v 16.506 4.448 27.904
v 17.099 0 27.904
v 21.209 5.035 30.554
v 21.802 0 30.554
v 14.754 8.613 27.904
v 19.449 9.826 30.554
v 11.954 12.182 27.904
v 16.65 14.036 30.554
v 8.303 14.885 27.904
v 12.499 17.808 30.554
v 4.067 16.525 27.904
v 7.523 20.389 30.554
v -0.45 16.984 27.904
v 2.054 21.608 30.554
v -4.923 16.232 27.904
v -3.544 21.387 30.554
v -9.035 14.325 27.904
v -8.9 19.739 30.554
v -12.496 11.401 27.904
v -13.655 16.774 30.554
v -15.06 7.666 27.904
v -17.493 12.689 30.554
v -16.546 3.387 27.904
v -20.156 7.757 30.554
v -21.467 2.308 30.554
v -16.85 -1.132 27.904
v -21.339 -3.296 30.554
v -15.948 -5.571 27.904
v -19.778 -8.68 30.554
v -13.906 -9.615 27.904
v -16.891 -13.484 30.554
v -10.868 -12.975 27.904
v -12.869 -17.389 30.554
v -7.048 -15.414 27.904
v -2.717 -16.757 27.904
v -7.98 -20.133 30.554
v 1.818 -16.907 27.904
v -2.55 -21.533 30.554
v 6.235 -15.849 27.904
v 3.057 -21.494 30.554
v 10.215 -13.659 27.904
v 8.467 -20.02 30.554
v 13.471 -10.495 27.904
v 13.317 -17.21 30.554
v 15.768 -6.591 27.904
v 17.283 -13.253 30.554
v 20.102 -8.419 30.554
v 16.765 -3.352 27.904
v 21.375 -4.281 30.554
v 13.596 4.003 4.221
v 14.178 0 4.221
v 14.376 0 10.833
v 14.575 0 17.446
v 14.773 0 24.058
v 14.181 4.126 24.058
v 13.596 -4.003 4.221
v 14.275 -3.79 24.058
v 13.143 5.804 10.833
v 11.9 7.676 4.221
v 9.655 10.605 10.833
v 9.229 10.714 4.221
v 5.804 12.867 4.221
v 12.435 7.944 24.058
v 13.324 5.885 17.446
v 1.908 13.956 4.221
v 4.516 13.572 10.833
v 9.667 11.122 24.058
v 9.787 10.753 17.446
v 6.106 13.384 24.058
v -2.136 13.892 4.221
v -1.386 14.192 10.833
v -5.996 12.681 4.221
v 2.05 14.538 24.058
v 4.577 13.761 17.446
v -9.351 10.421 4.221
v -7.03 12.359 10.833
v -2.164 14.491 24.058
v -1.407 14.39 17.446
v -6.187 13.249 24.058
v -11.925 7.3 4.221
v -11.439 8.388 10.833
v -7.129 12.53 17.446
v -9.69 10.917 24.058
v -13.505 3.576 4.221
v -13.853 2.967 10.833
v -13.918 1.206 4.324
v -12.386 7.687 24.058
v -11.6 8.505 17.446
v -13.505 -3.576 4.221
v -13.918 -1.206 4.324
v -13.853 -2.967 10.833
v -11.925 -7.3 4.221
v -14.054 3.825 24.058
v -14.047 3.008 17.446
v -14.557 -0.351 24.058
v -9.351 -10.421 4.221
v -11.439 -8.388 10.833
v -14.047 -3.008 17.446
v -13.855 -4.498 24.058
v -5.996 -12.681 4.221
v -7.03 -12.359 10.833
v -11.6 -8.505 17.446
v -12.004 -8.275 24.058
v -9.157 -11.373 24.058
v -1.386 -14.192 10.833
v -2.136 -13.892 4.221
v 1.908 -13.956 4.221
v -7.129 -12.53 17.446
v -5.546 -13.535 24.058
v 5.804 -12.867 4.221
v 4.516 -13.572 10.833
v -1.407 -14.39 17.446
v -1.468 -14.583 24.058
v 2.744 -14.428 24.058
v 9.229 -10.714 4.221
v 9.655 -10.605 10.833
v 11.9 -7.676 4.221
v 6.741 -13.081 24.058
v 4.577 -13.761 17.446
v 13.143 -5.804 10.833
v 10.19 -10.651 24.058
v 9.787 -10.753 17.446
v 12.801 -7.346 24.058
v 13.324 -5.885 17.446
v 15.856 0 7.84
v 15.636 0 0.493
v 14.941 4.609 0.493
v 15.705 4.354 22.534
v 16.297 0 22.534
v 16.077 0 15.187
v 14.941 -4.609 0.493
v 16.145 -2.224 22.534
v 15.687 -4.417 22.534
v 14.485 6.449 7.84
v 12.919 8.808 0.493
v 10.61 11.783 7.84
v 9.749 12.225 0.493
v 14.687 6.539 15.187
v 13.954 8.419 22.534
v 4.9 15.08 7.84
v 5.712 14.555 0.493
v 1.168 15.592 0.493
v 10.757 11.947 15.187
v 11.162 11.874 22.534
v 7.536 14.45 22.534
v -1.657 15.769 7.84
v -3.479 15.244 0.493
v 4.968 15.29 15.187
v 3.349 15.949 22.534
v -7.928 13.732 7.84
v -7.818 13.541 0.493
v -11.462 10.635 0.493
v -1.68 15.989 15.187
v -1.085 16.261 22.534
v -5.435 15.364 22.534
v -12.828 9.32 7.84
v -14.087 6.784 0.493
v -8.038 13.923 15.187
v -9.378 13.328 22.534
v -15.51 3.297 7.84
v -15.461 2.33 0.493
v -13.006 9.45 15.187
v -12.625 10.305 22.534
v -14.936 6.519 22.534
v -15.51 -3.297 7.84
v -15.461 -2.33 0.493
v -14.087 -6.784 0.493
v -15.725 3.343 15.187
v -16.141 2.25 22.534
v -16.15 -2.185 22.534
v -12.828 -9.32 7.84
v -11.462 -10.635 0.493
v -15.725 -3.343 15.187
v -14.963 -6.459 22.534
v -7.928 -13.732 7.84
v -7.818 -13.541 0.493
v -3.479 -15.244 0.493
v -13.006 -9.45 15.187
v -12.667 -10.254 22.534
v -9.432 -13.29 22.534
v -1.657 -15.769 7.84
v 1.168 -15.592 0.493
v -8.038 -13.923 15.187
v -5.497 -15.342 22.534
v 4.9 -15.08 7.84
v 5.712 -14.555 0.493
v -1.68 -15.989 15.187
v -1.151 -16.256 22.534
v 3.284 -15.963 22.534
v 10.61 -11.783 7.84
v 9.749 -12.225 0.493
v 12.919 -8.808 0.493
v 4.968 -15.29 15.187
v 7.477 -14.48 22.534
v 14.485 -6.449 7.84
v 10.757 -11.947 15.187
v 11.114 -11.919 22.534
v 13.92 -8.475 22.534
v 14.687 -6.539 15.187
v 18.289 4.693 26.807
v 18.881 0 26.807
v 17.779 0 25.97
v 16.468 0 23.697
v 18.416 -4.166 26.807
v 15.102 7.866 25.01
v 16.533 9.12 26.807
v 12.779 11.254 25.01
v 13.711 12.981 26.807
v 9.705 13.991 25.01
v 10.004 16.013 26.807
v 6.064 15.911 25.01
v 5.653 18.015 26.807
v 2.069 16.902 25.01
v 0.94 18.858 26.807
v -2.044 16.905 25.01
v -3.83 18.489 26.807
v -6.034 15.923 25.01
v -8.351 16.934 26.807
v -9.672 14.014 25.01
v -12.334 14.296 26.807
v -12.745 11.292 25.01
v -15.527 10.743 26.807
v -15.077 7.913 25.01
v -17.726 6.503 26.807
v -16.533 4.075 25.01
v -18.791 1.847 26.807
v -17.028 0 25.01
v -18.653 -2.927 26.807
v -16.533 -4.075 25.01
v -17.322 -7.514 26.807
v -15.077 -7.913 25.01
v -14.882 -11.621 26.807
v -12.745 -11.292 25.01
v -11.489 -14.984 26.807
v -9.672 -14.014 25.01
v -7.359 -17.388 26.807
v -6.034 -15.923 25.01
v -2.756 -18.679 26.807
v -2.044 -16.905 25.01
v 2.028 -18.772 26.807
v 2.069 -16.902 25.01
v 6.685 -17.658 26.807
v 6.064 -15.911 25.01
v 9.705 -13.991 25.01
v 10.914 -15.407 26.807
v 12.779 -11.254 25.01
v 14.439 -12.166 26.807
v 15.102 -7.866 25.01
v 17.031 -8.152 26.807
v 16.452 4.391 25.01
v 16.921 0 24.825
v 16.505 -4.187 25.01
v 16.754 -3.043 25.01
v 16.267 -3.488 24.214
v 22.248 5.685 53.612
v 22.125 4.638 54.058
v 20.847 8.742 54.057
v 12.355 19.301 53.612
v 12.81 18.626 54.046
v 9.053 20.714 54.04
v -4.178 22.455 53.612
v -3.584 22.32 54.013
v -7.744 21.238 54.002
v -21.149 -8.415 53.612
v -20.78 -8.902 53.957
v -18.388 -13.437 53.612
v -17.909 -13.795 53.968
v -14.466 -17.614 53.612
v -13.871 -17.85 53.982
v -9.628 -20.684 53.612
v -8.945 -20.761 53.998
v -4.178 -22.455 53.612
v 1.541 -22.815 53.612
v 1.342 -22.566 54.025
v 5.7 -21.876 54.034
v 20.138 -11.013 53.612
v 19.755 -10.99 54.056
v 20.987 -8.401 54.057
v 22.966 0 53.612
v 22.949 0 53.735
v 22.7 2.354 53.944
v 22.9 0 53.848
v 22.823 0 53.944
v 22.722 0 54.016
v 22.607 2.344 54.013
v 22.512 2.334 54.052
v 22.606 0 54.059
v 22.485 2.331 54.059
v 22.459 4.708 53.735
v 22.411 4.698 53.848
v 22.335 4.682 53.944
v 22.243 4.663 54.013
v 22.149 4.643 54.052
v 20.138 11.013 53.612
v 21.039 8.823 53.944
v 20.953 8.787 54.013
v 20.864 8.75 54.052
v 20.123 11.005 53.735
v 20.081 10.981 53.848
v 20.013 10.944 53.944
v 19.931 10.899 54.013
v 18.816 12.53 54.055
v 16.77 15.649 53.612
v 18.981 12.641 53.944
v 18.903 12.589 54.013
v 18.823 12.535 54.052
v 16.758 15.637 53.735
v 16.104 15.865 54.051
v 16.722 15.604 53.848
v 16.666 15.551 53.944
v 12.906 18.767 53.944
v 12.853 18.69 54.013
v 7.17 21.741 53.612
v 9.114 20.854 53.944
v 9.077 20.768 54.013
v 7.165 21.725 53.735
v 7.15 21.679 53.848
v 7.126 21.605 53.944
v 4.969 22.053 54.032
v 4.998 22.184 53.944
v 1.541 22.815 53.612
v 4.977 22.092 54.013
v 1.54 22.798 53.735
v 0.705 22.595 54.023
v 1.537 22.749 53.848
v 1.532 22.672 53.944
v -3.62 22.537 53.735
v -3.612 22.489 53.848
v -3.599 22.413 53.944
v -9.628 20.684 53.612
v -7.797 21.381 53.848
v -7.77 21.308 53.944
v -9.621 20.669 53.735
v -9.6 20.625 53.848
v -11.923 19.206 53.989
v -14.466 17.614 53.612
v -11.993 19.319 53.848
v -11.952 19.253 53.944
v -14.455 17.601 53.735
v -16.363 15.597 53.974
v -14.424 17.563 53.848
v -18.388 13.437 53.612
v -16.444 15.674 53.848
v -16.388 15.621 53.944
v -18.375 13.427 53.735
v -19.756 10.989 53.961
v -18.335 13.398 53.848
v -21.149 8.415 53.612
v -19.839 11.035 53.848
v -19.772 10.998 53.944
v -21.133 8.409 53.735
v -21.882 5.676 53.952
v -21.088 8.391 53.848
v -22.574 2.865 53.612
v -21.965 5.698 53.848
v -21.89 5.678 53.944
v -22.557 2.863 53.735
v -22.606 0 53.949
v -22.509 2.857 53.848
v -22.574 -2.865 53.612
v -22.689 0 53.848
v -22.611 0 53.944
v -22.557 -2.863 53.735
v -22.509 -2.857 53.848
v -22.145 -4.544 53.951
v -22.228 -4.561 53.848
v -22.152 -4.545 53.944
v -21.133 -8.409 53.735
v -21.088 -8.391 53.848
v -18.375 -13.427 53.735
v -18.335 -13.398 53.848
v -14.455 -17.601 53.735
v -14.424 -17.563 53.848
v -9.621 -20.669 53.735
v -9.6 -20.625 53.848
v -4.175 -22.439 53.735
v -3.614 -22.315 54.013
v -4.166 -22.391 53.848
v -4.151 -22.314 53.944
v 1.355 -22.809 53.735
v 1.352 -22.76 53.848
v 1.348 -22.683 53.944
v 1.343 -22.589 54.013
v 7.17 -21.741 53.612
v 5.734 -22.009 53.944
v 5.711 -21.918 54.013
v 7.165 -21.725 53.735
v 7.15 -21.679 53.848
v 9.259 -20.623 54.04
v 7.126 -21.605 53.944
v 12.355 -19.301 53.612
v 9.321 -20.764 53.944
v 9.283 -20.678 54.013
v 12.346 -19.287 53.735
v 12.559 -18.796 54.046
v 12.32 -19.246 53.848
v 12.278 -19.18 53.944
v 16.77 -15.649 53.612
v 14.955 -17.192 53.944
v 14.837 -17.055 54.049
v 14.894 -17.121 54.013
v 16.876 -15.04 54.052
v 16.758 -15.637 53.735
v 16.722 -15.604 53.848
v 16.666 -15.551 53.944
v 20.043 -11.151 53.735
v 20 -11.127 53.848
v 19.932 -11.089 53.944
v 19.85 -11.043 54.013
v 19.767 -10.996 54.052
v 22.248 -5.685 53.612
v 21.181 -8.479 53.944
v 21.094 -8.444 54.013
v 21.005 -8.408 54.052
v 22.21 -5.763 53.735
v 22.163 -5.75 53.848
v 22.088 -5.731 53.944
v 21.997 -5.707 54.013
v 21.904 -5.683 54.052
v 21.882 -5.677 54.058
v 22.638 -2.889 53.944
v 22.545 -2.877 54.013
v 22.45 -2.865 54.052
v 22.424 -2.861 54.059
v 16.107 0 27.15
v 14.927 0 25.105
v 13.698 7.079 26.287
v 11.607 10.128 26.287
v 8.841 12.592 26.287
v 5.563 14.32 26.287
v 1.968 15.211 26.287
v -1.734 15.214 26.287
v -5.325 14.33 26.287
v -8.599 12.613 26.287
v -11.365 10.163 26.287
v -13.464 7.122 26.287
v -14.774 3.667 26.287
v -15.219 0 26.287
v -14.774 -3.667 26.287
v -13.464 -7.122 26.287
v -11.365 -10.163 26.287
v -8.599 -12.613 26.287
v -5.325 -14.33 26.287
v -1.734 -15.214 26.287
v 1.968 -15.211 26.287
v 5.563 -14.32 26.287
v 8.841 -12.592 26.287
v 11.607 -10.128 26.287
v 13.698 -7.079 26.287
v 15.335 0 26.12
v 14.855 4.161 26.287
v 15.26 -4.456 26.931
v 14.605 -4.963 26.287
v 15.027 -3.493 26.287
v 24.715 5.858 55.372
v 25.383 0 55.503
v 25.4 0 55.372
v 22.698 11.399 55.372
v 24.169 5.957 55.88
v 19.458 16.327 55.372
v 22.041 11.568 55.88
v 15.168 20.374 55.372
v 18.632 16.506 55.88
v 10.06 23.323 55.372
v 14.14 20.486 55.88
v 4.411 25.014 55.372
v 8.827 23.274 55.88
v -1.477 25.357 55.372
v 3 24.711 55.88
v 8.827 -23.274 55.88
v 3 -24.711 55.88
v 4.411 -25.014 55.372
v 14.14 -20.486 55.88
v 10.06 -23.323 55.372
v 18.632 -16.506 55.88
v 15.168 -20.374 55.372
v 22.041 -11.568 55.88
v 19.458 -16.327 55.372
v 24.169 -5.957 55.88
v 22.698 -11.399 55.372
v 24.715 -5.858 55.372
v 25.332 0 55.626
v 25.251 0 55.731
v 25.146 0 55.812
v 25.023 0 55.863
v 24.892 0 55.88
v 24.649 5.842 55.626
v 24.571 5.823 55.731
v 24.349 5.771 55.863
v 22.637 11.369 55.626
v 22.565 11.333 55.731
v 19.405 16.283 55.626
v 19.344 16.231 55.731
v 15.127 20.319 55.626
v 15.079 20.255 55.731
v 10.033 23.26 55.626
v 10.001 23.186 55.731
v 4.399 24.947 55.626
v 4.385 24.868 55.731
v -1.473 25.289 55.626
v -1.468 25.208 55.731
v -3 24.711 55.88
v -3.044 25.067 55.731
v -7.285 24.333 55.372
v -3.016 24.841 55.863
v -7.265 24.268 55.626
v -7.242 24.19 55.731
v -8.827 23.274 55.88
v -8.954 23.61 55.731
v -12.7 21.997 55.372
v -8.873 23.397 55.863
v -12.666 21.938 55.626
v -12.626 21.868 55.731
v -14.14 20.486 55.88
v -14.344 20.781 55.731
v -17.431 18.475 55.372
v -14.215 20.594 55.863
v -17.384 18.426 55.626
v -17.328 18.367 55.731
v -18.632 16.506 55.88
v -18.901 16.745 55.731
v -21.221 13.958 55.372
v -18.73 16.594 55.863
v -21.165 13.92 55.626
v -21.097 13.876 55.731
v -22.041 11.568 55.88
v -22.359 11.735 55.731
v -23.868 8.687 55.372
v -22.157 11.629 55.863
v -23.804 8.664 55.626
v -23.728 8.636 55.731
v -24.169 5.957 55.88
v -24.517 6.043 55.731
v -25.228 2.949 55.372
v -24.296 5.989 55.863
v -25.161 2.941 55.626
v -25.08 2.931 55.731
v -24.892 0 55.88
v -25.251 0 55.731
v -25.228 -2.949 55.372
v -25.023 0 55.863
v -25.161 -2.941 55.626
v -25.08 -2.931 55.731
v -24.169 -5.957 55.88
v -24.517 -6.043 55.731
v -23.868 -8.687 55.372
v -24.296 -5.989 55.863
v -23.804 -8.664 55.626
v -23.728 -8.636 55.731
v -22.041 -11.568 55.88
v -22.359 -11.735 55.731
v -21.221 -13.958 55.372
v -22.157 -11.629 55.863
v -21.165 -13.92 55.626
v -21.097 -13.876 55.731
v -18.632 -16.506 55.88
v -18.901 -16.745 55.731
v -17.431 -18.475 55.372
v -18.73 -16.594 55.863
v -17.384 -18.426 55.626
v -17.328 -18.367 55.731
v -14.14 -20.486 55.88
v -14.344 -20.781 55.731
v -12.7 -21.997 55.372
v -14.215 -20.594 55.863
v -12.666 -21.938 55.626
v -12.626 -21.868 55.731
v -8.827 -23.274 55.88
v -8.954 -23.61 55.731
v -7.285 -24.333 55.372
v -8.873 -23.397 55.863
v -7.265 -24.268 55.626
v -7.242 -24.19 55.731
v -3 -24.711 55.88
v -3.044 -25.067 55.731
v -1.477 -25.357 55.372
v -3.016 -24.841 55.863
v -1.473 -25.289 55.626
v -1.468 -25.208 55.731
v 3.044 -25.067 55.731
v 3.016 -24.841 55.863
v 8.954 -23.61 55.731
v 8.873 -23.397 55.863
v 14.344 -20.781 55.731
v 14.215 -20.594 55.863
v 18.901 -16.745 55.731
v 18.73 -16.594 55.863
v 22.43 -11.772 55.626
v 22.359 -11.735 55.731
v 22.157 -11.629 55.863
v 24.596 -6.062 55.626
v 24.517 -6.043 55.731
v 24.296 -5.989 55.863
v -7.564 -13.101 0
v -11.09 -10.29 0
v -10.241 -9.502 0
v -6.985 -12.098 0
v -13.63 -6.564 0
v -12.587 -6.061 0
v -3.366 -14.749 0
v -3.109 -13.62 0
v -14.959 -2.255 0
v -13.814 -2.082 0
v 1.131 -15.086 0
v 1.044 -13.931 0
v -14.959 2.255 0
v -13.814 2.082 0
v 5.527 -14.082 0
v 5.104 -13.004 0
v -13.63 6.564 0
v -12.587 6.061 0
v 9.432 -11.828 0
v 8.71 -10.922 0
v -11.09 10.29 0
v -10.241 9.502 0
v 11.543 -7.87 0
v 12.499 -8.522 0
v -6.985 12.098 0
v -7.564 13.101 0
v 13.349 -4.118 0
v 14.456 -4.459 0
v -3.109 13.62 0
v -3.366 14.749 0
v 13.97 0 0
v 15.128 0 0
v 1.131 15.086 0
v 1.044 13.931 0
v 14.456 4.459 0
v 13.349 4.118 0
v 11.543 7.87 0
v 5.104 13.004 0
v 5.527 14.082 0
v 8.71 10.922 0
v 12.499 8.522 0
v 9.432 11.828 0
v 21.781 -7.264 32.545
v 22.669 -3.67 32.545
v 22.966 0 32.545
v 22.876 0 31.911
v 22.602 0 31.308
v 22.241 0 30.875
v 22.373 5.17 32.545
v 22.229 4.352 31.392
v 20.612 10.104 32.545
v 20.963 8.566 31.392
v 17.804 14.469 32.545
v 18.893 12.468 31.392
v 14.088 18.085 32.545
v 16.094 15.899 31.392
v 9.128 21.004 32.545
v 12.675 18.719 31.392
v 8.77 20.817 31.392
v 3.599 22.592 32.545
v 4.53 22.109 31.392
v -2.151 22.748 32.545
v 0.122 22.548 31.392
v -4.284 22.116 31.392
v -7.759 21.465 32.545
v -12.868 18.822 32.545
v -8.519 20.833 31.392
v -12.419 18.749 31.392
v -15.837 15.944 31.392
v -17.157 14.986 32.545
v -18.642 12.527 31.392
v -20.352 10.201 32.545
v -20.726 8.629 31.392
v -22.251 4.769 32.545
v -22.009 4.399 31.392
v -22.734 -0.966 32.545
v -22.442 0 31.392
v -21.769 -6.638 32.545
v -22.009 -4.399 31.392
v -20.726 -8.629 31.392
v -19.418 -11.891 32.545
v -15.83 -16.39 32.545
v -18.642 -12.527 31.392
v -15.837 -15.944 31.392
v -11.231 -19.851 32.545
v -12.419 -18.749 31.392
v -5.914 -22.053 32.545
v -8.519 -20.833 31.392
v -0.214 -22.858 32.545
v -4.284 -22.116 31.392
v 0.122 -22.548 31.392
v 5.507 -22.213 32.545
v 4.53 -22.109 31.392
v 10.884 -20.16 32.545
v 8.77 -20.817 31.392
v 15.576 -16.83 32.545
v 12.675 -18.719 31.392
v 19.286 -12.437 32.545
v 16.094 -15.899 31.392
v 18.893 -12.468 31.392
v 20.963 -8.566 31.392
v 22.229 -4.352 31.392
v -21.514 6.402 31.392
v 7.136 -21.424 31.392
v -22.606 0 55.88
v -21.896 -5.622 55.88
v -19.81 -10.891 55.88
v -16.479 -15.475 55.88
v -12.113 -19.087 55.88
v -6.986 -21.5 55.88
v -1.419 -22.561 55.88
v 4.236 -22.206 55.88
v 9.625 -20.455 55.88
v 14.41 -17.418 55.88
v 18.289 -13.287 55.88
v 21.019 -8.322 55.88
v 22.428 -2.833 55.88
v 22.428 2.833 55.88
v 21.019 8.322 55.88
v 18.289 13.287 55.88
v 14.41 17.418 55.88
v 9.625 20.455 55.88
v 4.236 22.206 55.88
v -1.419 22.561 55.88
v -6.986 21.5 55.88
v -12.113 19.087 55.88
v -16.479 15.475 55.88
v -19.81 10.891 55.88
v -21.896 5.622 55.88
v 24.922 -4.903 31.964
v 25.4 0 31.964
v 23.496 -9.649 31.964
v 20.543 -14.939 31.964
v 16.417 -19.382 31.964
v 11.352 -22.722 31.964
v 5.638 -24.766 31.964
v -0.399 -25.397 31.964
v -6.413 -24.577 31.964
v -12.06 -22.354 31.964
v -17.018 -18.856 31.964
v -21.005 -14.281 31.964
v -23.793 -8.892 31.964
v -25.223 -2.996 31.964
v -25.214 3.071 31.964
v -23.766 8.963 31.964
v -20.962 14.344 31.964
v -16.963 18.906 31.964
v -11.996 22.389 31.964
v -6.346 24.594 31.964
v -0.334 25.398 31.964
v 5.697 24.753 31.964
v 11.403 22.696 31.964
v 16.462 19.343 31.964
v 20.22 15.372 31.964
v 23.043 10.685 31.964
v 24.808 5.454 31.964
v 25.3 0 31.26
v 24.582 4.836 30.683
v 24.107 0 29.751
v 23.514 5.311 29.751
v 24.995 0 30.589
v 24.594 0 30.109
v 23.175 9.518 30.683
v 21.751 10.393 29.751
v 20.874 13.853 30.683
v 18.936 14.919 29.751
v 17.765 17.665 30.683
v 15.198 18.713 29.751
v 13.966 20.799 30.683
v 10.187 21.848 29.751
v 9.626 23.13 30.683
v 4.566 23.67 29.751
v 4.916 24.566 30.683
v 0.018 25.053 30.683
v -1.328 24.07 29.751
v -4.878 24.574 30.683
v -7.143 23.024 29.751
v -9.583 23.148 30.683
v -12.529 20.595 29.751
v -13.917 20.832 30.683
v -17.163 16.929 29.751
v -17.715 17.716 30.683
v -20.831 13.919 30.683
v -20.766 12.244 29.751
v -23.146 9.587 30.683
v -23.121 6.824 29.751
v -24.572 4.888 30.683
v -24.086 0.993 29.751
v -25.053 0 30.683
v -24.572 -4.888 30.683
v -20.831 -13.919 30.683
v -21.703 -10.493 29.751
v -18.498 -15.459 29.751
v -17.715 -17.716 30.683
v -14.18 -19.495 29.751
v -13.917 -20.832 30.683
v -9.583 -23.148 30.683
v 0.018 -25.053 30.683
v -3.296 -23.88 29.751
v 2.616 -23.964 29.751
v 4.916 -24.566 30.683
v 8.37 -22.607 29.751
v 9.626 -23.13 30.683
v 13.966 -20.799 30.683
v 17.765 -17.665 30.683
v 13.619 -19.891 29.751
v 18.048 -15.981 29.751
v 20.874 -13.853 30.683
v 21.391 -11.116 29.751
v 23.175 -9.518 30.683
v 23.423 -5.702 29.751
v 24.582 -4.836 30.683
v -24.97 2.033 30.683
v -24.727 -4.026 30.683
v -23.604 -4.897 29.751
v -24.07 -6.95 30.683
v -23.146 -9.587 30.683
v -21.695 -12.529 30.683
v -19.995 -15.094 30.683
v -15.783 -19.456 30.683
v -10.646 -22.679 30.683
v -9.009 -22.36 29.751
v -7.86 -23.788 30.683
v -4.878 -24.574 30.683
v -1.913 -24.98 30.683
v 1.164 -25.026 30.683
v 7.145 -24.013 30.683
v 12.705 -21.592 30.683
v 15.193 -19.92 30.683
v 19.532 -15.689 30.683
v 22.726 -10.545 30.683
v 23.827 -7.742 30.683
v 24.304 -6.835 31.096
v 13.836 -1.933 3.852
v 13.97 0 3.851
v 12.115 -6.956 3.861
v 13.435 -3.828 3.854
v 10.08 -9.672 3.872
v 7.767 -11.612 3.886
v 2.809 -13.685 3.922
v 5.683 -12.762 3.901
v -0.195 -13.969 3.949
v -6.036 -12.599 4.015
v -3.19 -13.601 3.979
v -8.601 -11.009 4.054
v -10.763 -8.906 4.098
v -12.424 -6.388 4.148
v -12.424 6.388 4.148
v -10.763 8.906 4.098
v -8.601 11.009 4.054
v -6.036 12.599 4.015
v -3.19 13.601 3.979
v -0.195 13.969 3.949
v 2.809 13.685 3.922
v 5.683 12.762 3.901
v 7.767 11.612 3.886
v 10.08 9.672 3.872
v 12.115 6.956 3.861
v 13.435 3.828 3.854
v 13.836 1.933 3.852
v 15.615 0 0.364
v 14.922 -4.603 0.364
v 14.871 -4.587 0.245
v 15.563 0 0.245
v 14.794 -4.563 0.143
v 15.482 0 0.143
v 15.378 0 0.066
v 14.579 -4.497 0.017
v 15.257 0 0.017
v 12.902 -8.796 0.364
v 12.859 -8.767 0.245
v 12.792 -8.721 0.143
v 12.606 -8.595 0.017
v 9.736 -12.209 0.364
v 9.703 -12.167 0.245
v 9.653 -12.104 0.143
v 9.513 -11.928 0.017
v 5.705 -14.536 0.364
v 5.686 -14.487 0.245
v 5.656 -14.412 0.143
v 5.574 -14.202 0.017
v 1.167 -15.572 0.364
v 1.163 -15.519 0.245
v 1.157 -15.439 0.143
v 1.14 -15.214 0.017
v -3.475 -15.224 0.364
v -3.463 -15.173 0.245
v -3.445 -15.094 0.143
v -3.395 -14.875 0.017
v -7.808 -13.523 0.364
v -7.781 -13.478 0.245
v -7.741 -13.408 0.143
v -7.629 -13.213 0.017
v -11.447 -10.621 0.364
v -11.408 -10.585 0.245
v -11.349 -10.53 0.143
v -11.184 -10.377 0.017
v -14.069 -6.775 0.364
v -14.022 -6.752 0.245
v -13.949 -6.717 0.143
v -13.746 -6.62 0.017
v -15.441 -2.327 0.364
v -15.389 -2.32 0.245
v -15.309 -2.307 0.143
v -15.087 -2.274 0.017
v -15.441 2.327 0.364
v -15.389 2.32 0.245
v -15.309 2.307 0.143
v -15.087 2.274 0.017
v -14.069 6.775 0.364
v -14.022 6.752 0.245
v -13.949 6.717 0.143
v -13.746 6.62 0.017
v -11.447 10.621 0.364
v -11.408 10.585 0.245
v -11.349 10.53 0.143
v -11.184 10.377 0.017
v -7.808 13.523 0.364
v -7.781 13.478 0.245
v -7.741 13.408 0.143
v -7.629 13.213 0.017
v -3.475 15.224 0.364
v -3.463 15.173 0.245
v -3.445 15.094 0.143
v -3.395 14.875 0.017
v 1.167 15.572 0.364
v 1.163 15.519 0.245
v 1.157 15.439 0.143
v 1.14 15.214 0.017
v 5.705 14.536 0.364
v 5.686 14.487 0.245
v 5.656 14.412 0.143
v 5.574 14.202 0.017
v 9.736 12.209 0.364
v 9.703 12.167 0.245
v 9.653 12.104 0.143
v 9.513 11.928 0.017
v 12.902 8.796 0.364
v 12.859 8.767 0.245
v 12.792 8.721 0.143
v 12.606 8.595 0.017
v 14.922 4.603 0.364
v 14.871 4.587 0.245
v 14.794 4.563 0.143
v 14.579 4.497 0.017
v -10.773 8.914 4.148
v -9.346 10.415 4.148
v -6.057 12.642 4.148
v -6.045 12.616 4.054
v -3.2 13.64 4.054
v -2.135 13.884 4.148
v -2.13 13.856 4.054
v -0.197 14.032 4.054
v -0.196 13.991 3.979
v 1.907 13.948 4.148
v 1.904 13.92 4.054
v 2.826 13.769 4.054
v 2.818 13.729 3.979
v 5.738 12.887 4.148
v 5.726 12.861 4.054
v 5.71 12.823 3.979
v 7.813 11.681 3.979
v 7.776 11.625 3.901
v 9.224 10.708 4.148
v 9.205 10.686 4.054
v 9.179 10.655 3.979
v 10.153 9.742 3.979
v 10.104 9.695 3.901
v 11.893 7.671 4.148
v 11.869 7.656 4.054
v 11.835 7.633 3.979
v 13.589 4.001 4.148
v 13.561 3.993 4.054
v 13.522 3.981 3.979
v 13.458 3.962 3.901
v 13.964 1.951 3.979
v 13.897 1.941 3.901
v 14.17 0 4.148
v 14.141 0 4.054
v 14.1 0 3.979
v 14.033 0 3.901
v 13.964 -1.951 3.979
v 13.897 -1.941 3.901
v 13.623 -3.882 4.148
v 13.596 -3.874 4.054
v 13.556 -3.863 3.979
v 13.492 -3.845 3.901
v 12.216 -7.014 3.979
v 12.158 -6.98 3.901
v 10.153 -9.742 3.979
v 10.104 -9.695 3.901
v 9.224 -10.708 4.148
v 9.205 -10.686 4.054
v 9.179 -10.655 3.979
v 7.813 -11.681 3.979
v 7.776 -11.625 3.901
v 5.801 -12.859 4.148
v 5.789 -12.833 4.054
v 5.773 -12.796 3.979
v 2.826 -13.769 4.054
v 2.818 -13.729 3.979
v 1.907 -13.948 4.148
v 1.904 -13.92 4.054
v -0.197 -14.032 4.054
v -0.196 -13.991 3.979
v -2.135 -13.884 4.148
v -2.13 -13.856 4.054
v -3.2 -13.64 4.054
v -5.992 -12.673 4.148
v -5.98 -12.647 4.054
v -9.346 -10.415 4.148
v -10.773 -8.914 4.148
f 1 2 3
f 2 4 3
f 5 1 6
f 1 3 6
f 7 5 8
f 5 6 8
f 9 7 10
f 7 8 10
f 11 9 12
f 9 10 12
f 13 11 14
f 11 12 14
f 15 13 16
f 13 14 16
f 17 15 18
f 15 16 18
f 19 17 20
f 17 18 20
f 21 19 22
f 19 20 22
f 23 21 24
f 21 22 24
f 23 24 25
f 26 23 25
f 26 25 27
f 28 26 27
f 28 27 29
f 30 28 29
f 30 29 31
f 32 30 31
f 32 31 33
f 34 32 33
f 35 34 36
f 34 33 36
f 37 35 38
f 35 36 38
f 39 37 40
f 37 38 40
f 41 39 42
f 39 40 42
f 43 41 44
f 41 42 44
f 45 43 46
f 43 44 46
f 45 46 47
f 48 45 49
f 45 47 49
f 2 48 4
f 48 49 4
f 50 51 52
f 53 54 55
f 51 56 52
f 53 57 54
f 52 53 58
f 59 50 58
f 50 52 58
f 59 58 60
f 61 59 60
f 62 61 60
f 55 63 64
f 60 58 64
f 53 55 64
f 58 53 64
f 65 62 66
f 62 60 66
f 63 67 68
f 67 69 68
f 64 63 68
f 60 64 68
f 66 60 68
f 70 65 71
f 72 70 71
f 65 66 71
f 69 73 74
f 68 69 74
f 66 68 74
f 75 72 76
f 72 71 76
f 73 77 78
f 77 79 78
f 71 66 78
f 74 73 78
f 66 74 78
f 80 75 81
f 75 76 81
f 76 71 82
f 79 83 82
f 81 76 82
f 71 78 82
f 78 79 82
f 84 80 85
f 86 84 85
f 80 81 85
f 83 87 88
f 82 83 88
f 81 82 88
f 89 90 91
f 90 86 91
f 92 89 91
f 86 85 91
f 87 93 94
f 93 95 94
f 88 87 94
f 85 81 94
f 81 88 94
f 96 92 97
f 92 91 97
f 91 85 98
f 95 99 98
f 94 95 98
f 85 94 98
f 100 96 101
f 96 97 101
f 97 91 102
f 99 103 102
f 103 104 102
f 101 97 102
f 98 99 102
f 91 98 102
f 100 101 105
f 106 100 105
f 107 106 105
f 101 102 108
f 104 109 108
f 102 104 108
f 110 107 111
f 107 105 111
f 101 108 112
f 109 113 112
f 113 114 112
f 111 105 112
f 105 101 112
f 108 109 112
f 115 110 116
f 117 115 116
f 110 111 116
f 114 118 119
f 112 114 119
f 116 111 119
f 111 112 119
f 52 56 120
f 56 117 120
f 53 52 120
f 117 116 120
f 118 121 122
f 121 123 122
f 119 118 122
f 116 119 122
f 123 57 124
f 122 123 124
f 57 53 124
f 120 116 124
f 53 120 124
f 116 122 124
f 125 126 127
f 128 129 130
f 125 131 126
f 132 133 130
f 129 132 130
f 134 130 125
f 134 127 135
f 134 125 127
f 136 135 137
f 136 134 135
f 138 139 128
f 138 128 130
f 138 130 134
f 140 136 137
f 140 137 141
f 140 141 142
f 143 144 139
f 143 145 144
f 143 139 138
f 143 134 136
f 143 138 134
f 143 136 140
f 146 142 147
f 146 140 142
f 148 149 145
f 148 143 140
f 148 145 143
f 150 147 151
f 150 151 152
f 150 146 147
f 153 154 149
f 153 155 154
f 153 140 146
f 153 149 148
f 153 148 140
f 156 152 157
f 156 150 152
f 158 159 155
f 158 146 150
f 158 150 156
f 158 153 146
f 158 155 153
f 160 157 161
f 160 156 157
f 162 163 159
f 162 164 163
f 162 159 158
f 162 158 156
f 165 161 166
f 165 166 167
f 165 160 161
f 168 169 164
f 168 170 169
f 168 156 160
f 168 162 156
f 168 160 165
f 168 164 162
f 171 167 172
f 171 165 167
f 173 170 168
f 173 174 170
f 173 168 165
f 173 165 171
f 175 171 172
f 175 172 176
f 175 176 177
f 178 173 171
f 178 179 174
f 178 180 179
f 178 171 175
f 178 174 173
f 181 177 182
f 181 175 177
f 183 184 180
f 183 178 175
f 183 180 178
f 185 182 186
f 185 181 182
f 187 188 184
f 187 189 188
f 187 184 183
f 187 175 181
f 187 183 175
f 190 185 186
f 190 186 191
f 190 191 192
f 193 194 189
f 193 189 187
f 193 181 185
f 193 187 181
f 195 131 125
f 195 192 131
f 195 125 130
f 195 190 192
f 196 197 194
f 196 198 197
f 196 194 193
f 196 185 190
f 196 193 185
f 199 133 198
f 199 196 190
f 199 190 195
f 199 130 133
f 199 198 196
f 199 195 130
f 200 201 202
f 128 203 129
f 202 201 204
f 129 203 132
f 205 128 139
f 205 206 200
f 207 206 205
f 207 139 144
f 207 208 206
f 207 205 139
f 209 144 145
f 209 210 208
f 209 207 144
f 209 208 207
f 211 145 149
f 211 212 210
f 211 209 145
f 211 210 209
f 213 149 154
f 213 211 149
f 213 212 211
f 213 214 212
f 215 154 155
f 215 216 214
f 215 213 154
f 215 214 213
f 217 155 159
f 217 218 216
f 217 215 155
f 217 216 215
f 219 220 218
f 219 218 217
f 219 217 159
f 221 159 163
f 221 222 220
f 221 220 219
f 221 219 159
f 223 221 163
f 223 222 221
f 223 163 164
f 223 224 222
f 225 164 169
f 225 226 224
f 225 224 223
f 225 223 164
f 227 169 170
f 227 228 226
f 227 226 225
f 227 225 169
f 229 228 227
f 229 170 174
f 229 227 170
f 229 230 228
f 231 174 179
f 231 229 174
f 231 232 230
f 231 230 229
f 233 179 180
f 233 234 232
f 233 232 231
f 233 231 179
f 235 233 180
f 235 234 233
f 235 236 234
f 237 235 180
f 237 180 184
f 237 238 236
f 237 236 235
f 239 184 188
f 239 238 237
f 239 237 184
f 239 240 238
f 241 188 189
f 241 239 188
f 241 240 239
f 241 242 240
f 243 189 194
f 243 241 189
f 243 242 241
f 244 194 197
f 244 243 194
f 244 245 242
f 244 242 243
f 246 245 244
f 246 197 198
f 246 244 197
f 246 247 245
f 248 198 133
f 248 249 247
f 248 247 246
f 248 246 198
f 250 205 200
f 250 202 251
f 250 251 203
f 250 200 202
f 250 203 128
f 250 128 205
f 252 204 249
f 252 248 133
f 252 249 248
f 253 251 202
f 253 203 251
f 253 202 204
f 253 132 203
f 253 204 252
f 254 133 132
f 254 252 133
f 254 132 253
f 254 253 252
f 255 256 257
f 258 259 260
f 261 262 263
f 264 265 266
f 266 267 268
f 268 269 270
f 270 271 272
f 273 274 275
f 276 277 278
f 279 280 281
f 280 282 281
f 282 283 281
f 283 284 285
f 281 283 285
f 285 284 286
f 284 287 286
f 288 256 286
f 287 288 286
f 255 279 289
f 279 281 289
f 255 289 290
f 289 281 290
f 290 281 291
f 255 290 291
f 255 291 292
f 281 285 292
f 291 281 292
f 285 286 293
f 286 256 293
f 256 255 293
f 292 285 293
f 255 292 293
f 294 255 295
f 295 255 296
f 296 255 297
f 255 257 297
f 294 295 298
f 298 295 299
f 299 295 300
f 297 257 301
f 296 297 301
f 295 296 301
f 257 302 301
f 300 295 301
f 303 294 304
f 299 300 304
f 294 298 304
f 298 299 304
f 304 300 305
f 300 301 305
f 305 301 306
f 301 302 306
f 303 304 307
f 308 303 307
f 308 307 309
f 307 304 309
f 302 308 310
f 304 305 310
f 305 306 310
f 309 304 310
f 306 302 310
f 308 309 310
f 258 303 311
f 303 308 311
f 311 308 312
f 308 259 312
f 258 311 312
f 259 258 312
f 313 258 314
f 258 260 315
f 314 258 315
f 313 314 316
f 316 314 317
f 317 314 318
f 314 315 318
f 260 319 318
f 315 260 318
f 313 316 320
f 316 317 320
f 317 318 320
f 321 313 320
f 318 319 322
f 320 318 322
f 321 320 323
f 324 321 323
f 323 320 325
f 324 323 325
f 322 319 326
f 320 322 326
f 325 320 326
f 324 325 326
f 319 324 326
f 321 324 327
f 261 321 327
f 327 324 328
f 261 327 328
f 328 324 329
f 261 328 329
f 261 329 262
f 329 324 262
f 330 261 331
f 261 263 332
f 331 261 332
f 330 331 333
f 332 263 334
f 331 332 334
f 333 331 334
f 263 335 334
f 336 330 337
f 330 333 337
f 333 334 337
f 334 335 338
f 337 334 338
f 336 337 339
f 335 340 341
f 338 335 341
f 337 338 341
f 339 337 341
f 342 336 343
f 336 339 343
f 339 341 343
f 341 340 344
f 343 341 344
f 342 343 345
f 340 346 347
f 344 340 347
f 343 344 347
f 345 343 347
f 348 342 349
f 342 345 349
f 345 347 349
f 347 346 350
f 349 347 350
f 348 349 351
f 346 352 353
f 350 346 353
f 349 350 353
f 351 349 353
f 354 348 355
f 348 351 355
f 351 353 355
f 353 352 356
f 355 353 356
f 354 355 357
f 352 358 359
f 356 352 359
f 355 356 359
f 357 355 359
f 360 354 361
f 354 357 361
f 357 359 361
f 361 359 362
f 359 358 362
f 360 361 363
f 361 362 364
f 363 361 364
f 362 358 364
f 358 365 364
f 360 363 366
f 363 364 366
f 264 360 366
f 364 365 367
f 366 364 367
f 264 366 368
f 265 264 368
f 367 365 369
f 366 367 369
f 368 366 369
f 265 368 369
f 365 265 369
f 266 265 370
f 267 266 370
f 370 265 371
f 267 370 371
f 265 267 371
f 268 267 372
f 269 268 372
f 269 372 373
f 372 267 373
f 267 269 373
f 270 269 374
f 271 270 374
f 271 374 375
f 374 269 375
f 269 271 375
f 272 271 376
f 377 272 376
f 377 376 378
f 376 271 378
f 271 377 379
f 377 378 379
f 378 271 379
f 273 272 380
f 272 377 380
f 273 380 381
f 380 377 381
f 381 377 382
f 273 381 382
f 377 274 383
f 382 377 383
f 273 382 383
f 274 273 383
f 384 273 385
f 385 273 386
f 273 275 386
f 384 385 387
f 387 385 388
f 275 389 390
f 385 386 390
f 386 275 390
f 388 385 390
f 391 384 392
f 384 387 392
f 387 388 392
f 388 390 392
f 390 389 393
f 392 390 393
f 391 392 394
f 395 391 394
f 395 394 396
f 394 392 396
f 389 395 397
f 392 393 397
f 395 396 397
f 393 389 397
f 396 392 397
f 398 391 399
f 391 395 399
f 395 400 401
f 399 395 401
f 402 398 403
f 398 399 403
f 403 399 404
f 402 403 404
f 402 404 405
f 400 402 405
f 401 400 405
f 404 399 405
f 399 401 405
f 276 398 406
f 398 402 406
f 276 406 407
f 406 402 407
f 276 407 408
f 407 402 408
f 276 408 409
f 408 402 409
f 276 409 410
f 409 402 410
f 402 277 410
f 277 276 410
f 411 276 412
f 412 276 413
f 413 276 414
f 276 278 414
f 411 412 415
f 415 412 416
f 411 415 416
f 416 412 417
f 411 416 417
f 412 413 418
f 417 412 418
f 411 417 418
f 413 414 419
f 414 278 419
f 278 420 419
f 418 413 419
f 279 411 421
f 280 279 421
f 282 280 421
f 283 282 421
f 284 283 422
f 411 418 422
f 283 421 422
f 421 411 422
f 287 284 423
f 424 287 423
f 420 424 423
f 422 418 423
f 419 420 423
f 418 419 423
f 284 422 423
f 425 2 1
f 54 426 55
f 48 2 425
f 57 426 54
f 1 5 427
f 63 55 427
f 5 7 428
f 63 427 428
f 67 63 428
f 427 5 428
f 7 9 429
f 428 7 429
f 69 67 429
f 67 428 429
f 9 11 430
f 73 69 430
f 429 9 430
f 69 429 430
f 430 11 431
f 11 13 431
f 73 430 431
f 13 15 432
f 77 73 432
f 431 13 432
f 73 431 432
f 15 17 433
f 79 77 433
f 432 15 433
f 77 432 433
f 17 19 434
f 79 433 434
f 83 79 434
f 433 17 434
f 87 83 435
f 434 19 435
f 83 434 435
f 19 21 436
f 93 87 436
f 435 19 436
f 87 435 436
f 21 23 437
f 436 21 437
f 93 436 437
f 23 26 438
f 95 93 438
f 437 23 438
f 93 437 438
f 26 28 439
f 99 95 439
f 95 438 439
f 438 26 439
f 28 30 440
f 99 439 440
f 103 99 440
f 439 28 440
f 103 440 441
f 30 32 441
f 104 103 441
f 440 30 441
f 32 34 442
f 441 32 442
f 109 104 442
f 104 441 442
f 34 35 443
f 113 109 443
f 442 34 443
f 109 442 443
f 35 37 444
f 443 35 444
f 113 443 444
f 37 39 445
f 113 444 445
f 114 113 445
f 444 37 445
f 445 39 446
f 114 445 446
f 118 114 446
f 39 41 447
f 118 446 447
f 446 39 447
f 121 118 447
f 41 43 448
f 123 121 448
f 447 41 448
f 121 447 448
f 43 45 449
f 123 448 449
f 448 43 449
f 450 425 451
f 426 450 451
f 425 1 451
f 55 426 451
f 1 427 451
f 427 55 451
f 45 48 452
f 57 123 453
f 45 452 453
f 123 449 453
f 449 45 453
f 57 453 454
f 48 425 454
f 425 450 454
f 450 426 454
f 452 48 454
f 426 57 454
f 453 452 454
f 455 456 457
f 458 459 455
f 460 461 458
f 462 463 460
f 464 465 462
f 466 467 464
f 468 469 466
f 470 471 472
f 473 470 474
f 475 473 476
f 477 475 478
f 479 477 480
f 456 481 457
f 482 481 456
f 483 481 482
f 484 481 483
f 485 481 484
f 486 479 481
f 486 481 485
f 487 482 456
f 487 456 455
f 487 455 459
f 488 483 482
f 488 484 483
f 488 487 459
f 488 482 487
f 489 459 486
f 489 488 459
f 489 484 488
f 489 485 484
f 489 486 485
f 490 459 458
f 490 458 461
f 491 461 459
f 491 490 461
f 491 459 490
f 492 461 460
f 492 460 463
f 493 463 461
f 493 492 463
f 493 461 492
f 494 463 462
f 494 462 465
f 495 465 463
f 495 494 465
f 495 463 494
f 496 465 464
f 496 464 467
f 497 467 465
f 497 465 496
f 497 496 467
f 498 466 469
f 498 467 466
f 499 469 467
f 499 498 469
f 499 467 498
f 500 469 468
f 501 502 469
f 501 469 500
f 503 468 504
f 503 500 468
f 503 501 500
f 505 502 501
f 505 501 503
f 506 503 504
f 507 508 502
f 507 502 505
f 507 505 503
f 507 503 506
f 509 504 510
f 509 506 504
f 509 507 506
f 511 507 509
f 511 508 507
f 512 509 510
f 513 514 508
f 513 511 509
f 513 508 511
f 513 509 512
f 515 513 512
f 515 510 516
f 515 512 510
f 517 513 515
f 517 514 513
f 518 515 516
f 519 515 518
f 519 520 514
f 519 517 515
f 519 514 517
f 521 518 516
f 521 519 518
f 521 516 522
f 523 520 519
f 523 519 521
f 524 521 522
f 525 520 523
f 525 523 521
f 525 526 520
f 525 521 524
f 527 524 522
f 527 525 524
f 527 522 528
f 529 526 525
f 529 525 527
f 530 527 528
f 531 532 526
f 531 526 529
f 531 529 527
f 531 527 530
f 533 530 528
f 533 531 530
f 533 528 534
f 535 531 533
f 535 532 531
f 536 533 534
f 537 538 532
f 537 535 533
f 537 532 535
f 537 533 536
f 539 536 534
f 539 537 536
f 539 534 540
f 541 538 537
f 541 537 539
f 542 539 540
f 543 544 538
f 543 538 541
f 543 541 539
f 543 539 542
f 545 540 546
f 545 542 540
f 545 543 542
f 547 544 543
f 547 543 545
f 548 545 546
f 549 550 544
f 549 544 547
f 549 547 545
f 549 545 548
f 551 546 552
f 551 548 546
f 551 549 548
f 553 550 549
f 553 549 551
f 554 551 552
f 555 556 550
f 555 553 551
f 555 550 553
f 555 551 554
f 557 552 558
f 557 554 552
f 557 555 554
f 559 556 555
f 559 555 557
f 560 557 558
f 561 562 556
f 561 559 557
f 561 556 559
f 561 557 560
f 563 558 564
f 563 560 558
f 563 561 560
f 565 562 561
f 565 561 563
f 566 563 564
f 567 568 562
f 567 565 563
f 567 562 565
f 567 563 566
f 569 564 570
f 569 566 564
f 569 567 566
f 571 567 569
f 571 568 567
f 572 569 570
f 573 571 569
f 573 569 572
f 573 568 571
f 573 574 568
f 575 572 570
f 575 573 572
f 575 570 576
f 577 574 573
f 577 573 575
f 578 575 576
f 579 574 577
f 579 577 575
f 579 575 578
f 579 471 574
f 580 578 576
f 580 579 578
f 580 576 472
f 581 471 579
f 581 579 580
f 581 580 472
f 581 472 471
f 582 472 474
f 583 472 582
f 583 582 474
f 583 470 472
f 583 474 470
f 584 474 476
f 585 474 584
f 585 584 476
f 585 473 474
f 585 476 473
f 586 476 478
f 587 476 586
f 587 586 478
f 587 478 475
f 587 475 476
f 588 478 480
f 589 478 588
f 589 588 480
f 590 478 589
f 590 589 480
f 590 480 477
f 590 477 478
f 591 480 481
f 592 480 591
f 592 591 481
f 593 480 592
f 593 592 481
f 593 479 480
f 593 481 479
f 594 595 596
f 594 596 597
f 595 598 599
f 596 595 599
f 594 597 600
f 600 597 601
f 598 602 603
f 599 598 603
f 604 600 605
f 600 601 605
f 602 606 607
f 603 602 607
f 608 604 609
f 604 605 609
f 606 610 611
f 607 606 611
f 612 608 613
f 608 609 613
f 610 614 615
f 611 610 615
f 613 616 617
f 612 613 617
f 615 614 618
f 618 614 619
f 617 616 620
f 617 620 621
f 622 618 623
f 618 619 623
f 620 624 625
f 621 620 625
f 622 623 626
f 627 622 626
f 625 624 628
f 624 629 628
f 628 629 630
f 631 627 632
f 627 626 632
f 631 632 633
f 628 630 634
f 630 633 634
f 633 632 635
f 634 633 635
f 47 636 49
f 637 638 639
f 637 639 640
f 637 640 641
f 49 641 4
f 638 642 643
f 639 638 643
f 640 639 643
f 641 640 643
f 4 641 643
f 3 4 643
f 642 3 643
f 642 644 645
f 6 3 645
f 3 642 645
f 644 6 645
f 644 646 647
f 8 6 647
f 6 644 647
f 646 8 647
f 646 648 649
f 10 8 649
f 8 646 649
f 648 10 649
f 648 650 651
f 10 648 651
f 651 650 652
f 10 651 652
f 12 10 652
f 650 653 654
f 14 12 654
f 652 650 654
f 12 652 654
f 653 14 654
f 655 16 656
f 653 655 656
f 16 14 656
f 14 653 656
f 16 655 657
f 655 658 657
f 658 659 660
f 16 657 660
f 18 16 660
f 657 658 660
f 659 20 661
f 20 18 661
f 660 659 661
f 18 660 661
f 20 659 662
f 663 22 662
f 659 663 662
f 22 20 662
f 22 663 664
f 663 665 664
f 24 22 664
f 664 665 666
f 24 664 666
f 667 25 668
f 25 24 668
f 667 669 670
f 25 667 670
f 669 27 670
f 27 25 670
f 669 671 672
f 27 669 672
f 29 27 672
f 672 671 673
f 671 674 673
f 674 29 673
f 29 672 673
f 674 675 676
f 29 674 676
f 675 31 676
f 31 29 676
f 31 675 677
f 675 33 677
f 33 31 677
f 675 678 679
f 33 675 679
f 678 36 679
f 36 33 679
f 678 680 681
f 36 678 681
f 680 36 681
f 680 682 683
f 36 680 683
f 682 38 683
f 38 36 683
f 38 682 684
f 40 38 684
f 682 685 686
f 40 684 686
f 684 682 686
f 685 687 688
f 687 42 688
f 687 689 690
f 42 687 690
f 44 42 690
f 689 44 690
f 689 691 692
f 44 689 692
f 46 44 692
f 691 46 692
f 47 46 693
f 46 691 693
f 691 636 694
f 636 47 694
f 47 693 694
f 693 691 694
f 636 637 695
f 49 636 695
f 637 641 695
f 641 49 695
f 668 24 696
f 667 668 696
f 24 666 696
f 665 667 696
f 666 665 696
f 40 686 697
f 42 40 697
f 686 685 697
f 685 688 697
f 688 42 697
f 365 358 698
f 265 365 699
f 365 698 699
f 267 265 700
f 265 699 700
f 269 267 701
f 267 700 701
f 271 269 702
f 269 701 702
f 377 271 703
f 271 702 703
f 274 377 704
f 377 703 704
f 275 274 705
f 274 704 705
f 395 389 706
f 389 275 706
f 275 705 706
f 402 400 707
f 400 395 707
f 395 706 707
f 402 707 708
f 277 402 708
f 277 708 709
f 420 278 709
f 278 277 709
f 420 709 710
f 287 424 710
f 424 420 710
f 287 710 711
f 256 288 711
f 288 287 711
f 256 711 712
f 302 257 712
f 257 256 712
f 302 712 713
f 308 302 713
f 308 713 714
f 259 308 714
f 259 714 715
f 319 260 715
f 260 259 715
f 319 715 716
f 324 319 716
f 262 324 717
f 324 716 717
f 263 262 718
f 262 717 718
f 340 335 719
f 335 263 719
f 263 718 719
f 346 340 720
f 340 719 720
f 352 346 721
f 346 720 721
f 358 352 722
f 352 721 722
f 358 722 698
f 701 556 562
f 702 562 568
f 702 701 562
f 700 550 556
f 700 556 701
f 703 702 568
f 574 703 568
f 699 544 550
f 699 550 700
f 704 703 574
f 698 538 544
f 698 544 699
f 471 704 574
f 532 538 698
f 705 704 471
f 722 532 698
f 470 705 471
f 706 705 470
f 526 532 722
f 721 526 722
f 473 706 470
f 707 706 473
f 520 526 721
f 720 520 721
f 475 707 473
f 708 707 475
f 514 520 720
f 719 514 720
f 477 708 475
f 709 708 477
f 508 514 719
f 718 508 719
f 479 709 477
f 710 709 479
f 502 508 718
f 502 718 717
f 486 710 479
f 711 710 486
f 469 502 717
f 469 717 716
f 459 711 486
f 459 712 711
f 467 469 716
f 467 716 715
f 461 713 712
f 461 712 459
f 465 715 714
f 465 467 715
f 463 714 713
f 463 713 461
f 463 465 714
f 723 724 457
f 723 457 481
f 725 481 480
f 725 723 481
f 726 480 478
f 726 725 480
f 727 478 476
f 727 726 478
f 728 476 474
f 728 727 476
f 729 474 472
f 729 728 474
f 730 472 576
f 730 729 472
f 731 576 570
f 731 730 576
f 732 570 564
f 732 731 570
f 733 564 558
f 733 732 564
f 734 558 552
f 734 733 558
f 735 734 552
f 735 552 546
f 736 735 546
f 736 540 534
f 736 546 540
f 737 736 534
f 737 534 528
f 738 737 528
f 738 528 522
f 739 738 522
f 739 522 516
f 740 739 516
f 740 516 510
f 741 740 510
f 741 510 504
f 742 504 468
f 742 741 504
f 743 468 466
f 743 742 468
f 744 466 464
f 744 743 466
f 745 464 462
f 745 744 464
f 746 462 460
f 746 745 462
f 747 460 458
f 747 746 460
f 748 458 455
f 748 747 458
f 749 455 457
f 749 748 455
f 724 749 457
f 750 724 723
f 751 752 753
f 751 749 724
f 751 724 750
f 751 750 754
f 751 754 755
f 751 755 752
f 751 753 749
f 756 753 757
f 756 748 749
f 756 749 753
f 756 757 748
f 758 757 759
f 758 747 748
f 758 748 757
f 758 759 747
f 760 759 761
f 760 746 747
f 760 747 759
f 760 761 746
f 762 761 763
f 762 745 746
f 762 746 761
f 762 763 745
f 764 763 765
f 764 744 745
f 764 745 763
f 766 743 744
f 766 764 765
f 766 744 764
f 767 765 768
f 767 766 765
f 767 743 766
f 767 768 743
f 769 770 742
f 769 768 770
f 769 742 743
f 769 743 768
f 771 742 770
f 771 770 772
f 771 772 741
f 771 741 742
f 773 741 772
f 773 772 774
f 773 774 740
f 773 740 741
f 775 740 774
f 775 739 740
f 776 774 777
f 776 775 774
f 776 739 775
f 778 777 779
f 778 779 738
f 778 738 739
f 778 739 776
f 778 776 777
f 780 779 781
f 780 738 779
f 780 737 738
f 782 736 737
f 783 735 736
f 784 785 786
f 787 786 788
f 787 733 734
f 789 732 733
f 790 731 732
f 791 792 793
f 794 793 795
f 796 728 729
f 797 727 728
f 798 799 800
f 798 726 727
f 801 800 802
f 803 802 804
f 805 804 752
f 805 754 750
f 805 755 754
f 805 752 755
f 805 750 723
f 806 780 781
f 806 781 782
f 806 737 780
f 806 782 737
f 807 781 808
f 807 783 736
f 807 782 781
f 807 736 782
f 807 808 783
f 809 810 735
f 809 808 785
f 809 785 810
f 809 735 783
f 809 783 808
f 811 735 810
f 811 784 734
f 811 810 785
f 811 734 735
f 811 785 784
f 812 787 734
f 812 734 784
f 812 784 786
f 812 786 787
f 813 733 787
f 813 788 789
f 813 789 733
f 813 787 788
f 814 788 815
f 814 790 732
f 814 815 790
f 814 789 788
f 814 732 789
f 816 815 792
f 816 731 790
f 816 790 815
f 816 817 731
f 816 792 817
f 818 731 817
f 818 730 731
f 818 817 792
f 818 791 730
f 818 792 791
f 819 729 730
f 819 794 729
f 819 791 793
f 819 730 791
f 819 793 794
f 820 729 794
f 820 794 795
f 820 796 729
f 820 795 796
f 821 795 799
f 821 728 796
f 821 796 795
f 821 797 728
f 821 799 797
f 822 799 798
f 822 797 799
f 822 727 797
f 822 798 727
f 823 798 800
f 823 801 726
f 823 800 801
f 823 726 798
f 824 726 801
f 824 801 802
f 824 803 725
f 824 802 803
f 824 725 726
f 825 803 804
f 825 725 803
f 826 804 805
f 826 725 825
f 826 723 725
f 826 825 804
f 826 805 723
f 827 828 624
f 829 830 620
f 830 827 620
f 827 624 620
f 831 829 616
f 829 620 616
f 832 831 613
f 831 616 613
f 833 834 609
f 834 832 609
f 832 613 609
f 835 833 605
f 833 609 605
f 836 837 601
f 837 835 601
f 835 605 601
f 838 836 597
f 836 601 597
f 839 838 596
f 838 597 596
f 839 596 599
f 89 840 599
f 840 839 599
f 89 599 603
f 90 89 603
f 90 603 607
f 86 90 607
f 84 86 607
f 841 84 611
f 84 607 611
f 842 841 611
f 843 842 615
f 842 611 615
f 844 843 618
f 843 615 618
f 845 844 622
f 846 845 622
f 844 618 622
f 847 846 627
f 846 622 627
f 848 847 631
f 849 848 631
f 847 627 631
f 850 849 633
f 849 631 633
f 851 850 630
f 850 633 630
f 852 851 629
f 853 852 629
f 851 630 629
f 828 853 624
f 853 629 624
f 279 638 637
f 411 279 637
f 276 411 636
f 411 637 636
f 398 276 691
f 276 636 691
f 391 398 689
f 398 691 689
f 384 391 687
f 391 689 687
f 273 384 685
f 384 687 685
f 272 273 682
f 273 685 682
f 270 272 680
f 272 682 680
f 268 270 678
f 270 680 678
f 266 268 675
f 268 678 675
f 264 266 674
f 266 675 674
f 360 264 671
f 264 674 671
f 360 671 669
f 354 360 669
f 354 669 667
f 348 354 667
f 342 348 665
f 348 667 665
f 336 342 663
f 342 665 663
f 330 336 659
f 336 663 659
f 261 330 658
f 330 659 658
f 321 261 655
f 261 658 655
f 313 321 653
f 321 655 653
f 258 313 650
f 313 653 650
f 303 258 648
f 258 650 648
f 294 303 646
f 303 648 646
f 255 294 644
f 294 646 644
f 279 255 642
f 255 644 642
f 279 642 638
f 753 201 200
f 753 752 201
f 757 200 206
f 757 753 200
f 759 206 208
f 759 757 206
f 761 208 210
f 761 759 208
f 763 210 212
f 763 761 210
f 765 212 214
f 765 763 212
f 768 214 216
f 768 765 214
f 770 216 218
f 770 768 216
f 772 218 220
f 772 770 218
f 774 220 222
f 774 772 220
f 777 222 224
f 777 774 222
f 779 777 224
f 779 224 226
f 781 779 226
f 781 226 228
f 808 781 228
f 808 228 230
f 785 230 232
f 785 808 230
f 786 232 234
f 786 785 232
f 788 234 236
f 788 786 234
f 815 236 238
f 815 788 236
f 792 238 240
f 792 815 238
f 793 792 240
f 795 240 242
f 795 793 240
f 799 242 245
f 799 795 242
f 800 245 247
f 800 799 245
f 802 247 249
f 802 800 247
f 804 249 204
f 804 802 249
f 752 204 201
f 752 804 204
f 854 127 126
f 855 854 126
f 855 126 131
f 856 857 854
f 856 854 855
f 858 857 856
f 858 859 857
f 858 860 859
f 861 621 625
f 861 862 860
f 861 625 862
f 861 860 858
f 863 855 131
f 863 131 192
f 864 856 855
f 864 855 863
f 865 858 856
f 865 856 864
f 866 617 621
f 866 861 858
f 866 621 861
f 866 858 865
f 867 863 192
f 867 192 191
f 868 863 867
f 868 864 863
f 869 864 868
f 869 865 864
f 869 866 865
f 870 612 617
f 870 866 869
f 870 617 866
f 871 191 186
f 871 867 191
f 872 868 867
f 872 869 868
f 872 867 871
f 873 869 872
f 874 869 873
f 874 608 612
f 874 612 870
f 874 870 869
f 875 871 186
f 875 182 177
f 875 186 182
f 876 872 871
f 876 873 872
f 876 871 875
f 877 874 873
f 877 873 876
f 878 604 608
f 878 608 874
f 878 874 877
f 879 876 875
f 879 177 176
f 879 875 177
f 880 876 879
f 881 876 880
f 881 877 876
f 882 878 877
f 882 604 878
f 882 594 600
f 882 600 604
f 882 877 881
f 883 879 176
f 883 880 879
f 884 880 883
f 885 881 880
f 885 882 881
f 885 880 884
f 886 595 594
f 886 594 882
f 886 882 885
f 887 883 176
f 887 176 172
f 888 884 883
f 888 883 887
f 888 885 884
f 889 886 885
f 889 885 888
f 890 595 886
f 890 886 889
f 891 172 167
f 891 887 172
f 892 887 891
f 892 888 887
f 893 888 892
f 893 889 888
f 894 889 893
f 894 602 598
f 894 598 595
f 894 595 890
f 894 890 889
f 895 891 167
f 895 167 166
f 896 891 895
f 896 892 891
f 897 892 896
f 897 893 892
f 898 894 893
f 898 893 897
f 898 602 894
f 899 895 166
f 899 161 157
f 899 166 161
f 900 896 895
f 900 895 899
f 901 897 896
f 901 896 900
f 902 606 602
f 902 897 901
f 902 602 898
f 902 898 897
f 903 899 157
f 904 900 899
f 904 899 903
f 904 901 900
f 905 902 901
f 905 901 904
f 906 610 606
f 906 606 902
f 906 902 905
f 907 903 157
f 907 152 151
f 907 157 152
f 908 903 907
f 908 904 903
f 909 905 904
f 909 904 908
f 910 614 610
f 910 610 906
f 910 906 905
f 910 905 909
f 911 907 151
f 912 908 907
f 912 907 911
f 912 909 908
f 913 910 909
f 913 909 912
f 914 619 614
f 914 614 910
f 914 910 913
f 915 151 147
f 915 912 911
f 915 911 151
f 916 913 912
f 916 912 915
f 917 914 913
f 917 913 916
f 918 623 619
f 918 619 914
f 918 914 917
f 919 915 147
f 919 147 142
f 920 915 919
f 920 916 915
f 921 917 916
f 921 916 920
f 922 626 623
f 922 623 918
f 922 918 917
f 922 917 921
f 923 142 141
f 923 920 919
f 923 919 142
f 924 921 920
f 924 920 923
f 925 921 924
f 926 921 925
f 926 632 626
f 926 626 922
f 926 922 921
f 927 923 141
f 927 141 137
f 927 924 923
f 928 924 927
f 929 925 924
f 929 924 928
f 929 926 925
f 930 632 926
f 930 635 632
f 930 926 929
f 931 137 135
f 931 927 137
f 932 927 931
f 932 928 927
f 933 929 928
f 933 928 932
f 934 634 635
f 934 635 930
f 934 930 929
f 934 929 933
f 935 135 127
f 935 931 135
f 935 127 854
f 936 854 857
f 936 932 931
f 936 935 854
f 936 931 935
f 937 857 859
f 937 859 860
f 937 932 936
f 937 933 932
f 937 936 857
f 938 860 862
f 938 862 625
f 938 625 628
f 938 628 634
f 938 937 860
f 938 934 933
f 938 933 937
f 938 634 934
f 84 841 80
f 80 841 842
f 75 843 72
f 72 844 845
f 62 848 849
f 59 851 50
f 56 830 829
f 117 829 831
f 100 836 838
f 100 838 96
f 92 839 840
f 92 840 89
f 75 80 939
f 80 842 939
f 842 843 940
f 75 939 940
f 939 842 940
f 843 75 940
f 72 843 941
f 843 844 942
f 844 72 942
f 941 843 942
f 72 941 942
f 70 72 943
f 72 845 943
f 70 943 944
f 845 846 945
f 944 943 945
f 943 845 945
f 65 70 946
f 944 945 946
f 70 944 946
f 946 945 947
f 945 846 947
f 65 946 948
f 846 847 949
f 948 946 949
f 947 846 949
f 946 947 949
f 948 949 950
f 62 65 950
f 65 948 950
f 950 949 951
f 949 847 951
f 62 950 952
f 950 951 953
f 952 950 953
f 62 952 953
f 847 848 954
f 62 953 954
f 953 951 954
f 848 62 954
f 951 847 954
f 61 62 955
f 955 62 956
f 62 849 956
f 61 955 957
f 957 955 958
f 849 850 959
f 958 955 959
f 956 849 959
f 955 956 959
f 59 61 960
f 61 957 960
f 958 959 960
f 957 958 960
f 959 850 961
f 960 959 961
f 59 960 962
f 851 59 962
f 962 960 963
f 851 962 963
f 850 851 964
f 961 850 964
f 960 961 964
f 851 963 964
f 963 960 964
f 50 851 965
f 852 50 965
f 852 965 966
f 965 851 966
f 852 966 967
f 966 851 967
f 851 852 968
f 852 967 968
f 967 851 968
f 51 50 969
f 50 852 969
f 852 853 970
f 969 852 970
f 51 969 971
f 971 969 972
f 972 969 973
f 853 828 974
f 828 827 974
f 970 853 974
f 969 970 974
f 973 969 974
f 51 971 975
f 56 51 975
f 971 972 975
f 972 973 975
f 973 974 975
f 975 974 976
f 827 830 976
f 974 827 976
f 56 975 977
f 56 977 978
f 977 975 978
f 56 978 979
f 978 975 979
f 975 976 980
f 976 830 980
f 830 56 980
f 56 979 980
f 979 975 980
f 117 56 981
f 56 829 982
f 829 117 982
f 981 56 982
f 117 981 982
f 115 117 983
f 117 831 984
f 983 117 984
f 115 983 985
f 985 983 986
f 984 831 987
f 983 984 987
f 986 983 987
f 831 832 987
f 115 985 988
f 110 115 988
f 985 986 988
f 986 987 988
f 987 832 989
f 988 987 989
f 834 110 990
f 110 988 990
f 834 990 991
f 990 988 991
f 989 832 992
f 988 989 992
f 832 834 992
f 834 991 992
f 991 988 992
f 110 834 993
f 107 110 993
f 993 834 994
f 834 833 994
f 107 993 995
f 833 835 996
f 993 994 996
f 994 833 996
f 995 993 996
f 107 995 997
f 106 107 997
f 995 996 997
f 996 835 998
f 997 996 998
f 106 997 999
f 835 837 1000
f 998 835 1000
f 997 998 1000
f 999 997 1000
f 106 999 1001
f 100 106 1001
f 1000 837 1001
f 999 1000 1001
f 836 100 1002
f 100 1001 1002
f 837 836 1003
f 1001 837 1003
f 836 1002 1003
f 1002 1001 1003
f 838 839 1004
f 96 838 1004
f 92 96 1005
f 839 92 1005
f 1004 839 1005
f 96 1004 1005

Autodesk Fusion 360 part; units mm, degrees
sketch "Sketch1" plane through (0, 0, 0) normal (0, 0, 1) x (1, 0, 0)
  circle A0 centre (0, 0) radius 15.621
  dimension "d1" = 31.242
ref_plane "WorkPlane1" through (0, 0, 25.4) normal (0, 0, 1) x (1, 0, 0)
sketch "Sketch2" plane through (0, 0, 25.4) normal (0, 0, 1) x (1, 0, 0)
  circle A0 centre (0, 0) radius 16.383
  dimension "d3" = 32.766
loft "Loft1" add profiles "Sketch2", "Sketch1" section 1 section 2 makes body 1
ref_plane "WorkPlane2" through (0, 0, 30.48) normal (0, 0, 1) x (1, 0, 0)
sketch "Sketch3" plane through (0, 0, 30.48) normal (0, 0, 1) x (1, 0, 0)
  circle A0 centre (0, 0) radius 25.4
  dimension "d5" = 50.8
loft "Loft2" add profiles "Sketch3" section 1 face at (2.7305, 4.7294, 25.4) section 2 on bodies 1 bodies 1
fillet "Fillet1" radius 5.08 1 edges at (-15.2743, 5.9243, 25.4) on bodies 1
extrude "Extrude1" add 1 faces at (1.8419, 7.6928, 30.48) along direction (0, 0, 1) blind 25.4 on bodies 1 bodies 1
fillet "Fillet2" radius 2.54 1 edges at (-23.6811, 9.185, 30.48) on bodies 1
fillet "Fillet3" radius 0.508 1 edges at (-14.5639, -5.6488, 0) on bodies 1
fillet "Fillet4" radius 0.508 1 edges at (-23.6811, -9.185, 55.88) on bodies 1
copy_body "CopyPasteBodies1" bodies 1 makes body 2
move_body "Move1" bodies 2 to x (1, 0, 0) y (0, 1, 0) z (0, 0, 1) at (0, 0, -2.54)
move_body "Move2" bodies 2 to x (1, 0, 0) y (0, 1, 0) z (0, 0, 1) at (0, 0, 2.54)
scale "Scale1" factor 0.9 about (16.297, 0, 22.5339) bodies 2
move_body "Move3" bodies 2 to x (1, 0, 0) y (0, 1, 0) z (0, 0, 1) at (-1.524, 0, 0)
move_body "Move4" bodies 2 to x (1, 0, 0) y (0, 1, 0) z (0, 0, 1) at (0, 0, 1.524)
sketch "Sketch4" plane through (0, 0, 55.88) normal (0, 0, 1) x (-1, 0, 0)
  circle A0 centre (0, 0) radius 24.892
  circle A1 centre (0, 0) radius 22.606
  dimension "d17" = 45.212
combine "Combine1" operation cut target body 1 tool bodies 2
extrude "Extrude2" cut sketch "Sketch4" against normal blind 24.13 contours A1 bodies 1
sketch "Sketch5" plane through (0, 0, 0) normal (0, 0, -1) x (1, 0, 0)
  circle A0 centre (0, 0) radius 15.128
  circle A1 centre (0, 0) radius 13.97
  dimension "d20" = 27.94
extrude "Extrude3" cut sketch "Sketch5" against normal blind 111.76 contours A1 bodies 1
